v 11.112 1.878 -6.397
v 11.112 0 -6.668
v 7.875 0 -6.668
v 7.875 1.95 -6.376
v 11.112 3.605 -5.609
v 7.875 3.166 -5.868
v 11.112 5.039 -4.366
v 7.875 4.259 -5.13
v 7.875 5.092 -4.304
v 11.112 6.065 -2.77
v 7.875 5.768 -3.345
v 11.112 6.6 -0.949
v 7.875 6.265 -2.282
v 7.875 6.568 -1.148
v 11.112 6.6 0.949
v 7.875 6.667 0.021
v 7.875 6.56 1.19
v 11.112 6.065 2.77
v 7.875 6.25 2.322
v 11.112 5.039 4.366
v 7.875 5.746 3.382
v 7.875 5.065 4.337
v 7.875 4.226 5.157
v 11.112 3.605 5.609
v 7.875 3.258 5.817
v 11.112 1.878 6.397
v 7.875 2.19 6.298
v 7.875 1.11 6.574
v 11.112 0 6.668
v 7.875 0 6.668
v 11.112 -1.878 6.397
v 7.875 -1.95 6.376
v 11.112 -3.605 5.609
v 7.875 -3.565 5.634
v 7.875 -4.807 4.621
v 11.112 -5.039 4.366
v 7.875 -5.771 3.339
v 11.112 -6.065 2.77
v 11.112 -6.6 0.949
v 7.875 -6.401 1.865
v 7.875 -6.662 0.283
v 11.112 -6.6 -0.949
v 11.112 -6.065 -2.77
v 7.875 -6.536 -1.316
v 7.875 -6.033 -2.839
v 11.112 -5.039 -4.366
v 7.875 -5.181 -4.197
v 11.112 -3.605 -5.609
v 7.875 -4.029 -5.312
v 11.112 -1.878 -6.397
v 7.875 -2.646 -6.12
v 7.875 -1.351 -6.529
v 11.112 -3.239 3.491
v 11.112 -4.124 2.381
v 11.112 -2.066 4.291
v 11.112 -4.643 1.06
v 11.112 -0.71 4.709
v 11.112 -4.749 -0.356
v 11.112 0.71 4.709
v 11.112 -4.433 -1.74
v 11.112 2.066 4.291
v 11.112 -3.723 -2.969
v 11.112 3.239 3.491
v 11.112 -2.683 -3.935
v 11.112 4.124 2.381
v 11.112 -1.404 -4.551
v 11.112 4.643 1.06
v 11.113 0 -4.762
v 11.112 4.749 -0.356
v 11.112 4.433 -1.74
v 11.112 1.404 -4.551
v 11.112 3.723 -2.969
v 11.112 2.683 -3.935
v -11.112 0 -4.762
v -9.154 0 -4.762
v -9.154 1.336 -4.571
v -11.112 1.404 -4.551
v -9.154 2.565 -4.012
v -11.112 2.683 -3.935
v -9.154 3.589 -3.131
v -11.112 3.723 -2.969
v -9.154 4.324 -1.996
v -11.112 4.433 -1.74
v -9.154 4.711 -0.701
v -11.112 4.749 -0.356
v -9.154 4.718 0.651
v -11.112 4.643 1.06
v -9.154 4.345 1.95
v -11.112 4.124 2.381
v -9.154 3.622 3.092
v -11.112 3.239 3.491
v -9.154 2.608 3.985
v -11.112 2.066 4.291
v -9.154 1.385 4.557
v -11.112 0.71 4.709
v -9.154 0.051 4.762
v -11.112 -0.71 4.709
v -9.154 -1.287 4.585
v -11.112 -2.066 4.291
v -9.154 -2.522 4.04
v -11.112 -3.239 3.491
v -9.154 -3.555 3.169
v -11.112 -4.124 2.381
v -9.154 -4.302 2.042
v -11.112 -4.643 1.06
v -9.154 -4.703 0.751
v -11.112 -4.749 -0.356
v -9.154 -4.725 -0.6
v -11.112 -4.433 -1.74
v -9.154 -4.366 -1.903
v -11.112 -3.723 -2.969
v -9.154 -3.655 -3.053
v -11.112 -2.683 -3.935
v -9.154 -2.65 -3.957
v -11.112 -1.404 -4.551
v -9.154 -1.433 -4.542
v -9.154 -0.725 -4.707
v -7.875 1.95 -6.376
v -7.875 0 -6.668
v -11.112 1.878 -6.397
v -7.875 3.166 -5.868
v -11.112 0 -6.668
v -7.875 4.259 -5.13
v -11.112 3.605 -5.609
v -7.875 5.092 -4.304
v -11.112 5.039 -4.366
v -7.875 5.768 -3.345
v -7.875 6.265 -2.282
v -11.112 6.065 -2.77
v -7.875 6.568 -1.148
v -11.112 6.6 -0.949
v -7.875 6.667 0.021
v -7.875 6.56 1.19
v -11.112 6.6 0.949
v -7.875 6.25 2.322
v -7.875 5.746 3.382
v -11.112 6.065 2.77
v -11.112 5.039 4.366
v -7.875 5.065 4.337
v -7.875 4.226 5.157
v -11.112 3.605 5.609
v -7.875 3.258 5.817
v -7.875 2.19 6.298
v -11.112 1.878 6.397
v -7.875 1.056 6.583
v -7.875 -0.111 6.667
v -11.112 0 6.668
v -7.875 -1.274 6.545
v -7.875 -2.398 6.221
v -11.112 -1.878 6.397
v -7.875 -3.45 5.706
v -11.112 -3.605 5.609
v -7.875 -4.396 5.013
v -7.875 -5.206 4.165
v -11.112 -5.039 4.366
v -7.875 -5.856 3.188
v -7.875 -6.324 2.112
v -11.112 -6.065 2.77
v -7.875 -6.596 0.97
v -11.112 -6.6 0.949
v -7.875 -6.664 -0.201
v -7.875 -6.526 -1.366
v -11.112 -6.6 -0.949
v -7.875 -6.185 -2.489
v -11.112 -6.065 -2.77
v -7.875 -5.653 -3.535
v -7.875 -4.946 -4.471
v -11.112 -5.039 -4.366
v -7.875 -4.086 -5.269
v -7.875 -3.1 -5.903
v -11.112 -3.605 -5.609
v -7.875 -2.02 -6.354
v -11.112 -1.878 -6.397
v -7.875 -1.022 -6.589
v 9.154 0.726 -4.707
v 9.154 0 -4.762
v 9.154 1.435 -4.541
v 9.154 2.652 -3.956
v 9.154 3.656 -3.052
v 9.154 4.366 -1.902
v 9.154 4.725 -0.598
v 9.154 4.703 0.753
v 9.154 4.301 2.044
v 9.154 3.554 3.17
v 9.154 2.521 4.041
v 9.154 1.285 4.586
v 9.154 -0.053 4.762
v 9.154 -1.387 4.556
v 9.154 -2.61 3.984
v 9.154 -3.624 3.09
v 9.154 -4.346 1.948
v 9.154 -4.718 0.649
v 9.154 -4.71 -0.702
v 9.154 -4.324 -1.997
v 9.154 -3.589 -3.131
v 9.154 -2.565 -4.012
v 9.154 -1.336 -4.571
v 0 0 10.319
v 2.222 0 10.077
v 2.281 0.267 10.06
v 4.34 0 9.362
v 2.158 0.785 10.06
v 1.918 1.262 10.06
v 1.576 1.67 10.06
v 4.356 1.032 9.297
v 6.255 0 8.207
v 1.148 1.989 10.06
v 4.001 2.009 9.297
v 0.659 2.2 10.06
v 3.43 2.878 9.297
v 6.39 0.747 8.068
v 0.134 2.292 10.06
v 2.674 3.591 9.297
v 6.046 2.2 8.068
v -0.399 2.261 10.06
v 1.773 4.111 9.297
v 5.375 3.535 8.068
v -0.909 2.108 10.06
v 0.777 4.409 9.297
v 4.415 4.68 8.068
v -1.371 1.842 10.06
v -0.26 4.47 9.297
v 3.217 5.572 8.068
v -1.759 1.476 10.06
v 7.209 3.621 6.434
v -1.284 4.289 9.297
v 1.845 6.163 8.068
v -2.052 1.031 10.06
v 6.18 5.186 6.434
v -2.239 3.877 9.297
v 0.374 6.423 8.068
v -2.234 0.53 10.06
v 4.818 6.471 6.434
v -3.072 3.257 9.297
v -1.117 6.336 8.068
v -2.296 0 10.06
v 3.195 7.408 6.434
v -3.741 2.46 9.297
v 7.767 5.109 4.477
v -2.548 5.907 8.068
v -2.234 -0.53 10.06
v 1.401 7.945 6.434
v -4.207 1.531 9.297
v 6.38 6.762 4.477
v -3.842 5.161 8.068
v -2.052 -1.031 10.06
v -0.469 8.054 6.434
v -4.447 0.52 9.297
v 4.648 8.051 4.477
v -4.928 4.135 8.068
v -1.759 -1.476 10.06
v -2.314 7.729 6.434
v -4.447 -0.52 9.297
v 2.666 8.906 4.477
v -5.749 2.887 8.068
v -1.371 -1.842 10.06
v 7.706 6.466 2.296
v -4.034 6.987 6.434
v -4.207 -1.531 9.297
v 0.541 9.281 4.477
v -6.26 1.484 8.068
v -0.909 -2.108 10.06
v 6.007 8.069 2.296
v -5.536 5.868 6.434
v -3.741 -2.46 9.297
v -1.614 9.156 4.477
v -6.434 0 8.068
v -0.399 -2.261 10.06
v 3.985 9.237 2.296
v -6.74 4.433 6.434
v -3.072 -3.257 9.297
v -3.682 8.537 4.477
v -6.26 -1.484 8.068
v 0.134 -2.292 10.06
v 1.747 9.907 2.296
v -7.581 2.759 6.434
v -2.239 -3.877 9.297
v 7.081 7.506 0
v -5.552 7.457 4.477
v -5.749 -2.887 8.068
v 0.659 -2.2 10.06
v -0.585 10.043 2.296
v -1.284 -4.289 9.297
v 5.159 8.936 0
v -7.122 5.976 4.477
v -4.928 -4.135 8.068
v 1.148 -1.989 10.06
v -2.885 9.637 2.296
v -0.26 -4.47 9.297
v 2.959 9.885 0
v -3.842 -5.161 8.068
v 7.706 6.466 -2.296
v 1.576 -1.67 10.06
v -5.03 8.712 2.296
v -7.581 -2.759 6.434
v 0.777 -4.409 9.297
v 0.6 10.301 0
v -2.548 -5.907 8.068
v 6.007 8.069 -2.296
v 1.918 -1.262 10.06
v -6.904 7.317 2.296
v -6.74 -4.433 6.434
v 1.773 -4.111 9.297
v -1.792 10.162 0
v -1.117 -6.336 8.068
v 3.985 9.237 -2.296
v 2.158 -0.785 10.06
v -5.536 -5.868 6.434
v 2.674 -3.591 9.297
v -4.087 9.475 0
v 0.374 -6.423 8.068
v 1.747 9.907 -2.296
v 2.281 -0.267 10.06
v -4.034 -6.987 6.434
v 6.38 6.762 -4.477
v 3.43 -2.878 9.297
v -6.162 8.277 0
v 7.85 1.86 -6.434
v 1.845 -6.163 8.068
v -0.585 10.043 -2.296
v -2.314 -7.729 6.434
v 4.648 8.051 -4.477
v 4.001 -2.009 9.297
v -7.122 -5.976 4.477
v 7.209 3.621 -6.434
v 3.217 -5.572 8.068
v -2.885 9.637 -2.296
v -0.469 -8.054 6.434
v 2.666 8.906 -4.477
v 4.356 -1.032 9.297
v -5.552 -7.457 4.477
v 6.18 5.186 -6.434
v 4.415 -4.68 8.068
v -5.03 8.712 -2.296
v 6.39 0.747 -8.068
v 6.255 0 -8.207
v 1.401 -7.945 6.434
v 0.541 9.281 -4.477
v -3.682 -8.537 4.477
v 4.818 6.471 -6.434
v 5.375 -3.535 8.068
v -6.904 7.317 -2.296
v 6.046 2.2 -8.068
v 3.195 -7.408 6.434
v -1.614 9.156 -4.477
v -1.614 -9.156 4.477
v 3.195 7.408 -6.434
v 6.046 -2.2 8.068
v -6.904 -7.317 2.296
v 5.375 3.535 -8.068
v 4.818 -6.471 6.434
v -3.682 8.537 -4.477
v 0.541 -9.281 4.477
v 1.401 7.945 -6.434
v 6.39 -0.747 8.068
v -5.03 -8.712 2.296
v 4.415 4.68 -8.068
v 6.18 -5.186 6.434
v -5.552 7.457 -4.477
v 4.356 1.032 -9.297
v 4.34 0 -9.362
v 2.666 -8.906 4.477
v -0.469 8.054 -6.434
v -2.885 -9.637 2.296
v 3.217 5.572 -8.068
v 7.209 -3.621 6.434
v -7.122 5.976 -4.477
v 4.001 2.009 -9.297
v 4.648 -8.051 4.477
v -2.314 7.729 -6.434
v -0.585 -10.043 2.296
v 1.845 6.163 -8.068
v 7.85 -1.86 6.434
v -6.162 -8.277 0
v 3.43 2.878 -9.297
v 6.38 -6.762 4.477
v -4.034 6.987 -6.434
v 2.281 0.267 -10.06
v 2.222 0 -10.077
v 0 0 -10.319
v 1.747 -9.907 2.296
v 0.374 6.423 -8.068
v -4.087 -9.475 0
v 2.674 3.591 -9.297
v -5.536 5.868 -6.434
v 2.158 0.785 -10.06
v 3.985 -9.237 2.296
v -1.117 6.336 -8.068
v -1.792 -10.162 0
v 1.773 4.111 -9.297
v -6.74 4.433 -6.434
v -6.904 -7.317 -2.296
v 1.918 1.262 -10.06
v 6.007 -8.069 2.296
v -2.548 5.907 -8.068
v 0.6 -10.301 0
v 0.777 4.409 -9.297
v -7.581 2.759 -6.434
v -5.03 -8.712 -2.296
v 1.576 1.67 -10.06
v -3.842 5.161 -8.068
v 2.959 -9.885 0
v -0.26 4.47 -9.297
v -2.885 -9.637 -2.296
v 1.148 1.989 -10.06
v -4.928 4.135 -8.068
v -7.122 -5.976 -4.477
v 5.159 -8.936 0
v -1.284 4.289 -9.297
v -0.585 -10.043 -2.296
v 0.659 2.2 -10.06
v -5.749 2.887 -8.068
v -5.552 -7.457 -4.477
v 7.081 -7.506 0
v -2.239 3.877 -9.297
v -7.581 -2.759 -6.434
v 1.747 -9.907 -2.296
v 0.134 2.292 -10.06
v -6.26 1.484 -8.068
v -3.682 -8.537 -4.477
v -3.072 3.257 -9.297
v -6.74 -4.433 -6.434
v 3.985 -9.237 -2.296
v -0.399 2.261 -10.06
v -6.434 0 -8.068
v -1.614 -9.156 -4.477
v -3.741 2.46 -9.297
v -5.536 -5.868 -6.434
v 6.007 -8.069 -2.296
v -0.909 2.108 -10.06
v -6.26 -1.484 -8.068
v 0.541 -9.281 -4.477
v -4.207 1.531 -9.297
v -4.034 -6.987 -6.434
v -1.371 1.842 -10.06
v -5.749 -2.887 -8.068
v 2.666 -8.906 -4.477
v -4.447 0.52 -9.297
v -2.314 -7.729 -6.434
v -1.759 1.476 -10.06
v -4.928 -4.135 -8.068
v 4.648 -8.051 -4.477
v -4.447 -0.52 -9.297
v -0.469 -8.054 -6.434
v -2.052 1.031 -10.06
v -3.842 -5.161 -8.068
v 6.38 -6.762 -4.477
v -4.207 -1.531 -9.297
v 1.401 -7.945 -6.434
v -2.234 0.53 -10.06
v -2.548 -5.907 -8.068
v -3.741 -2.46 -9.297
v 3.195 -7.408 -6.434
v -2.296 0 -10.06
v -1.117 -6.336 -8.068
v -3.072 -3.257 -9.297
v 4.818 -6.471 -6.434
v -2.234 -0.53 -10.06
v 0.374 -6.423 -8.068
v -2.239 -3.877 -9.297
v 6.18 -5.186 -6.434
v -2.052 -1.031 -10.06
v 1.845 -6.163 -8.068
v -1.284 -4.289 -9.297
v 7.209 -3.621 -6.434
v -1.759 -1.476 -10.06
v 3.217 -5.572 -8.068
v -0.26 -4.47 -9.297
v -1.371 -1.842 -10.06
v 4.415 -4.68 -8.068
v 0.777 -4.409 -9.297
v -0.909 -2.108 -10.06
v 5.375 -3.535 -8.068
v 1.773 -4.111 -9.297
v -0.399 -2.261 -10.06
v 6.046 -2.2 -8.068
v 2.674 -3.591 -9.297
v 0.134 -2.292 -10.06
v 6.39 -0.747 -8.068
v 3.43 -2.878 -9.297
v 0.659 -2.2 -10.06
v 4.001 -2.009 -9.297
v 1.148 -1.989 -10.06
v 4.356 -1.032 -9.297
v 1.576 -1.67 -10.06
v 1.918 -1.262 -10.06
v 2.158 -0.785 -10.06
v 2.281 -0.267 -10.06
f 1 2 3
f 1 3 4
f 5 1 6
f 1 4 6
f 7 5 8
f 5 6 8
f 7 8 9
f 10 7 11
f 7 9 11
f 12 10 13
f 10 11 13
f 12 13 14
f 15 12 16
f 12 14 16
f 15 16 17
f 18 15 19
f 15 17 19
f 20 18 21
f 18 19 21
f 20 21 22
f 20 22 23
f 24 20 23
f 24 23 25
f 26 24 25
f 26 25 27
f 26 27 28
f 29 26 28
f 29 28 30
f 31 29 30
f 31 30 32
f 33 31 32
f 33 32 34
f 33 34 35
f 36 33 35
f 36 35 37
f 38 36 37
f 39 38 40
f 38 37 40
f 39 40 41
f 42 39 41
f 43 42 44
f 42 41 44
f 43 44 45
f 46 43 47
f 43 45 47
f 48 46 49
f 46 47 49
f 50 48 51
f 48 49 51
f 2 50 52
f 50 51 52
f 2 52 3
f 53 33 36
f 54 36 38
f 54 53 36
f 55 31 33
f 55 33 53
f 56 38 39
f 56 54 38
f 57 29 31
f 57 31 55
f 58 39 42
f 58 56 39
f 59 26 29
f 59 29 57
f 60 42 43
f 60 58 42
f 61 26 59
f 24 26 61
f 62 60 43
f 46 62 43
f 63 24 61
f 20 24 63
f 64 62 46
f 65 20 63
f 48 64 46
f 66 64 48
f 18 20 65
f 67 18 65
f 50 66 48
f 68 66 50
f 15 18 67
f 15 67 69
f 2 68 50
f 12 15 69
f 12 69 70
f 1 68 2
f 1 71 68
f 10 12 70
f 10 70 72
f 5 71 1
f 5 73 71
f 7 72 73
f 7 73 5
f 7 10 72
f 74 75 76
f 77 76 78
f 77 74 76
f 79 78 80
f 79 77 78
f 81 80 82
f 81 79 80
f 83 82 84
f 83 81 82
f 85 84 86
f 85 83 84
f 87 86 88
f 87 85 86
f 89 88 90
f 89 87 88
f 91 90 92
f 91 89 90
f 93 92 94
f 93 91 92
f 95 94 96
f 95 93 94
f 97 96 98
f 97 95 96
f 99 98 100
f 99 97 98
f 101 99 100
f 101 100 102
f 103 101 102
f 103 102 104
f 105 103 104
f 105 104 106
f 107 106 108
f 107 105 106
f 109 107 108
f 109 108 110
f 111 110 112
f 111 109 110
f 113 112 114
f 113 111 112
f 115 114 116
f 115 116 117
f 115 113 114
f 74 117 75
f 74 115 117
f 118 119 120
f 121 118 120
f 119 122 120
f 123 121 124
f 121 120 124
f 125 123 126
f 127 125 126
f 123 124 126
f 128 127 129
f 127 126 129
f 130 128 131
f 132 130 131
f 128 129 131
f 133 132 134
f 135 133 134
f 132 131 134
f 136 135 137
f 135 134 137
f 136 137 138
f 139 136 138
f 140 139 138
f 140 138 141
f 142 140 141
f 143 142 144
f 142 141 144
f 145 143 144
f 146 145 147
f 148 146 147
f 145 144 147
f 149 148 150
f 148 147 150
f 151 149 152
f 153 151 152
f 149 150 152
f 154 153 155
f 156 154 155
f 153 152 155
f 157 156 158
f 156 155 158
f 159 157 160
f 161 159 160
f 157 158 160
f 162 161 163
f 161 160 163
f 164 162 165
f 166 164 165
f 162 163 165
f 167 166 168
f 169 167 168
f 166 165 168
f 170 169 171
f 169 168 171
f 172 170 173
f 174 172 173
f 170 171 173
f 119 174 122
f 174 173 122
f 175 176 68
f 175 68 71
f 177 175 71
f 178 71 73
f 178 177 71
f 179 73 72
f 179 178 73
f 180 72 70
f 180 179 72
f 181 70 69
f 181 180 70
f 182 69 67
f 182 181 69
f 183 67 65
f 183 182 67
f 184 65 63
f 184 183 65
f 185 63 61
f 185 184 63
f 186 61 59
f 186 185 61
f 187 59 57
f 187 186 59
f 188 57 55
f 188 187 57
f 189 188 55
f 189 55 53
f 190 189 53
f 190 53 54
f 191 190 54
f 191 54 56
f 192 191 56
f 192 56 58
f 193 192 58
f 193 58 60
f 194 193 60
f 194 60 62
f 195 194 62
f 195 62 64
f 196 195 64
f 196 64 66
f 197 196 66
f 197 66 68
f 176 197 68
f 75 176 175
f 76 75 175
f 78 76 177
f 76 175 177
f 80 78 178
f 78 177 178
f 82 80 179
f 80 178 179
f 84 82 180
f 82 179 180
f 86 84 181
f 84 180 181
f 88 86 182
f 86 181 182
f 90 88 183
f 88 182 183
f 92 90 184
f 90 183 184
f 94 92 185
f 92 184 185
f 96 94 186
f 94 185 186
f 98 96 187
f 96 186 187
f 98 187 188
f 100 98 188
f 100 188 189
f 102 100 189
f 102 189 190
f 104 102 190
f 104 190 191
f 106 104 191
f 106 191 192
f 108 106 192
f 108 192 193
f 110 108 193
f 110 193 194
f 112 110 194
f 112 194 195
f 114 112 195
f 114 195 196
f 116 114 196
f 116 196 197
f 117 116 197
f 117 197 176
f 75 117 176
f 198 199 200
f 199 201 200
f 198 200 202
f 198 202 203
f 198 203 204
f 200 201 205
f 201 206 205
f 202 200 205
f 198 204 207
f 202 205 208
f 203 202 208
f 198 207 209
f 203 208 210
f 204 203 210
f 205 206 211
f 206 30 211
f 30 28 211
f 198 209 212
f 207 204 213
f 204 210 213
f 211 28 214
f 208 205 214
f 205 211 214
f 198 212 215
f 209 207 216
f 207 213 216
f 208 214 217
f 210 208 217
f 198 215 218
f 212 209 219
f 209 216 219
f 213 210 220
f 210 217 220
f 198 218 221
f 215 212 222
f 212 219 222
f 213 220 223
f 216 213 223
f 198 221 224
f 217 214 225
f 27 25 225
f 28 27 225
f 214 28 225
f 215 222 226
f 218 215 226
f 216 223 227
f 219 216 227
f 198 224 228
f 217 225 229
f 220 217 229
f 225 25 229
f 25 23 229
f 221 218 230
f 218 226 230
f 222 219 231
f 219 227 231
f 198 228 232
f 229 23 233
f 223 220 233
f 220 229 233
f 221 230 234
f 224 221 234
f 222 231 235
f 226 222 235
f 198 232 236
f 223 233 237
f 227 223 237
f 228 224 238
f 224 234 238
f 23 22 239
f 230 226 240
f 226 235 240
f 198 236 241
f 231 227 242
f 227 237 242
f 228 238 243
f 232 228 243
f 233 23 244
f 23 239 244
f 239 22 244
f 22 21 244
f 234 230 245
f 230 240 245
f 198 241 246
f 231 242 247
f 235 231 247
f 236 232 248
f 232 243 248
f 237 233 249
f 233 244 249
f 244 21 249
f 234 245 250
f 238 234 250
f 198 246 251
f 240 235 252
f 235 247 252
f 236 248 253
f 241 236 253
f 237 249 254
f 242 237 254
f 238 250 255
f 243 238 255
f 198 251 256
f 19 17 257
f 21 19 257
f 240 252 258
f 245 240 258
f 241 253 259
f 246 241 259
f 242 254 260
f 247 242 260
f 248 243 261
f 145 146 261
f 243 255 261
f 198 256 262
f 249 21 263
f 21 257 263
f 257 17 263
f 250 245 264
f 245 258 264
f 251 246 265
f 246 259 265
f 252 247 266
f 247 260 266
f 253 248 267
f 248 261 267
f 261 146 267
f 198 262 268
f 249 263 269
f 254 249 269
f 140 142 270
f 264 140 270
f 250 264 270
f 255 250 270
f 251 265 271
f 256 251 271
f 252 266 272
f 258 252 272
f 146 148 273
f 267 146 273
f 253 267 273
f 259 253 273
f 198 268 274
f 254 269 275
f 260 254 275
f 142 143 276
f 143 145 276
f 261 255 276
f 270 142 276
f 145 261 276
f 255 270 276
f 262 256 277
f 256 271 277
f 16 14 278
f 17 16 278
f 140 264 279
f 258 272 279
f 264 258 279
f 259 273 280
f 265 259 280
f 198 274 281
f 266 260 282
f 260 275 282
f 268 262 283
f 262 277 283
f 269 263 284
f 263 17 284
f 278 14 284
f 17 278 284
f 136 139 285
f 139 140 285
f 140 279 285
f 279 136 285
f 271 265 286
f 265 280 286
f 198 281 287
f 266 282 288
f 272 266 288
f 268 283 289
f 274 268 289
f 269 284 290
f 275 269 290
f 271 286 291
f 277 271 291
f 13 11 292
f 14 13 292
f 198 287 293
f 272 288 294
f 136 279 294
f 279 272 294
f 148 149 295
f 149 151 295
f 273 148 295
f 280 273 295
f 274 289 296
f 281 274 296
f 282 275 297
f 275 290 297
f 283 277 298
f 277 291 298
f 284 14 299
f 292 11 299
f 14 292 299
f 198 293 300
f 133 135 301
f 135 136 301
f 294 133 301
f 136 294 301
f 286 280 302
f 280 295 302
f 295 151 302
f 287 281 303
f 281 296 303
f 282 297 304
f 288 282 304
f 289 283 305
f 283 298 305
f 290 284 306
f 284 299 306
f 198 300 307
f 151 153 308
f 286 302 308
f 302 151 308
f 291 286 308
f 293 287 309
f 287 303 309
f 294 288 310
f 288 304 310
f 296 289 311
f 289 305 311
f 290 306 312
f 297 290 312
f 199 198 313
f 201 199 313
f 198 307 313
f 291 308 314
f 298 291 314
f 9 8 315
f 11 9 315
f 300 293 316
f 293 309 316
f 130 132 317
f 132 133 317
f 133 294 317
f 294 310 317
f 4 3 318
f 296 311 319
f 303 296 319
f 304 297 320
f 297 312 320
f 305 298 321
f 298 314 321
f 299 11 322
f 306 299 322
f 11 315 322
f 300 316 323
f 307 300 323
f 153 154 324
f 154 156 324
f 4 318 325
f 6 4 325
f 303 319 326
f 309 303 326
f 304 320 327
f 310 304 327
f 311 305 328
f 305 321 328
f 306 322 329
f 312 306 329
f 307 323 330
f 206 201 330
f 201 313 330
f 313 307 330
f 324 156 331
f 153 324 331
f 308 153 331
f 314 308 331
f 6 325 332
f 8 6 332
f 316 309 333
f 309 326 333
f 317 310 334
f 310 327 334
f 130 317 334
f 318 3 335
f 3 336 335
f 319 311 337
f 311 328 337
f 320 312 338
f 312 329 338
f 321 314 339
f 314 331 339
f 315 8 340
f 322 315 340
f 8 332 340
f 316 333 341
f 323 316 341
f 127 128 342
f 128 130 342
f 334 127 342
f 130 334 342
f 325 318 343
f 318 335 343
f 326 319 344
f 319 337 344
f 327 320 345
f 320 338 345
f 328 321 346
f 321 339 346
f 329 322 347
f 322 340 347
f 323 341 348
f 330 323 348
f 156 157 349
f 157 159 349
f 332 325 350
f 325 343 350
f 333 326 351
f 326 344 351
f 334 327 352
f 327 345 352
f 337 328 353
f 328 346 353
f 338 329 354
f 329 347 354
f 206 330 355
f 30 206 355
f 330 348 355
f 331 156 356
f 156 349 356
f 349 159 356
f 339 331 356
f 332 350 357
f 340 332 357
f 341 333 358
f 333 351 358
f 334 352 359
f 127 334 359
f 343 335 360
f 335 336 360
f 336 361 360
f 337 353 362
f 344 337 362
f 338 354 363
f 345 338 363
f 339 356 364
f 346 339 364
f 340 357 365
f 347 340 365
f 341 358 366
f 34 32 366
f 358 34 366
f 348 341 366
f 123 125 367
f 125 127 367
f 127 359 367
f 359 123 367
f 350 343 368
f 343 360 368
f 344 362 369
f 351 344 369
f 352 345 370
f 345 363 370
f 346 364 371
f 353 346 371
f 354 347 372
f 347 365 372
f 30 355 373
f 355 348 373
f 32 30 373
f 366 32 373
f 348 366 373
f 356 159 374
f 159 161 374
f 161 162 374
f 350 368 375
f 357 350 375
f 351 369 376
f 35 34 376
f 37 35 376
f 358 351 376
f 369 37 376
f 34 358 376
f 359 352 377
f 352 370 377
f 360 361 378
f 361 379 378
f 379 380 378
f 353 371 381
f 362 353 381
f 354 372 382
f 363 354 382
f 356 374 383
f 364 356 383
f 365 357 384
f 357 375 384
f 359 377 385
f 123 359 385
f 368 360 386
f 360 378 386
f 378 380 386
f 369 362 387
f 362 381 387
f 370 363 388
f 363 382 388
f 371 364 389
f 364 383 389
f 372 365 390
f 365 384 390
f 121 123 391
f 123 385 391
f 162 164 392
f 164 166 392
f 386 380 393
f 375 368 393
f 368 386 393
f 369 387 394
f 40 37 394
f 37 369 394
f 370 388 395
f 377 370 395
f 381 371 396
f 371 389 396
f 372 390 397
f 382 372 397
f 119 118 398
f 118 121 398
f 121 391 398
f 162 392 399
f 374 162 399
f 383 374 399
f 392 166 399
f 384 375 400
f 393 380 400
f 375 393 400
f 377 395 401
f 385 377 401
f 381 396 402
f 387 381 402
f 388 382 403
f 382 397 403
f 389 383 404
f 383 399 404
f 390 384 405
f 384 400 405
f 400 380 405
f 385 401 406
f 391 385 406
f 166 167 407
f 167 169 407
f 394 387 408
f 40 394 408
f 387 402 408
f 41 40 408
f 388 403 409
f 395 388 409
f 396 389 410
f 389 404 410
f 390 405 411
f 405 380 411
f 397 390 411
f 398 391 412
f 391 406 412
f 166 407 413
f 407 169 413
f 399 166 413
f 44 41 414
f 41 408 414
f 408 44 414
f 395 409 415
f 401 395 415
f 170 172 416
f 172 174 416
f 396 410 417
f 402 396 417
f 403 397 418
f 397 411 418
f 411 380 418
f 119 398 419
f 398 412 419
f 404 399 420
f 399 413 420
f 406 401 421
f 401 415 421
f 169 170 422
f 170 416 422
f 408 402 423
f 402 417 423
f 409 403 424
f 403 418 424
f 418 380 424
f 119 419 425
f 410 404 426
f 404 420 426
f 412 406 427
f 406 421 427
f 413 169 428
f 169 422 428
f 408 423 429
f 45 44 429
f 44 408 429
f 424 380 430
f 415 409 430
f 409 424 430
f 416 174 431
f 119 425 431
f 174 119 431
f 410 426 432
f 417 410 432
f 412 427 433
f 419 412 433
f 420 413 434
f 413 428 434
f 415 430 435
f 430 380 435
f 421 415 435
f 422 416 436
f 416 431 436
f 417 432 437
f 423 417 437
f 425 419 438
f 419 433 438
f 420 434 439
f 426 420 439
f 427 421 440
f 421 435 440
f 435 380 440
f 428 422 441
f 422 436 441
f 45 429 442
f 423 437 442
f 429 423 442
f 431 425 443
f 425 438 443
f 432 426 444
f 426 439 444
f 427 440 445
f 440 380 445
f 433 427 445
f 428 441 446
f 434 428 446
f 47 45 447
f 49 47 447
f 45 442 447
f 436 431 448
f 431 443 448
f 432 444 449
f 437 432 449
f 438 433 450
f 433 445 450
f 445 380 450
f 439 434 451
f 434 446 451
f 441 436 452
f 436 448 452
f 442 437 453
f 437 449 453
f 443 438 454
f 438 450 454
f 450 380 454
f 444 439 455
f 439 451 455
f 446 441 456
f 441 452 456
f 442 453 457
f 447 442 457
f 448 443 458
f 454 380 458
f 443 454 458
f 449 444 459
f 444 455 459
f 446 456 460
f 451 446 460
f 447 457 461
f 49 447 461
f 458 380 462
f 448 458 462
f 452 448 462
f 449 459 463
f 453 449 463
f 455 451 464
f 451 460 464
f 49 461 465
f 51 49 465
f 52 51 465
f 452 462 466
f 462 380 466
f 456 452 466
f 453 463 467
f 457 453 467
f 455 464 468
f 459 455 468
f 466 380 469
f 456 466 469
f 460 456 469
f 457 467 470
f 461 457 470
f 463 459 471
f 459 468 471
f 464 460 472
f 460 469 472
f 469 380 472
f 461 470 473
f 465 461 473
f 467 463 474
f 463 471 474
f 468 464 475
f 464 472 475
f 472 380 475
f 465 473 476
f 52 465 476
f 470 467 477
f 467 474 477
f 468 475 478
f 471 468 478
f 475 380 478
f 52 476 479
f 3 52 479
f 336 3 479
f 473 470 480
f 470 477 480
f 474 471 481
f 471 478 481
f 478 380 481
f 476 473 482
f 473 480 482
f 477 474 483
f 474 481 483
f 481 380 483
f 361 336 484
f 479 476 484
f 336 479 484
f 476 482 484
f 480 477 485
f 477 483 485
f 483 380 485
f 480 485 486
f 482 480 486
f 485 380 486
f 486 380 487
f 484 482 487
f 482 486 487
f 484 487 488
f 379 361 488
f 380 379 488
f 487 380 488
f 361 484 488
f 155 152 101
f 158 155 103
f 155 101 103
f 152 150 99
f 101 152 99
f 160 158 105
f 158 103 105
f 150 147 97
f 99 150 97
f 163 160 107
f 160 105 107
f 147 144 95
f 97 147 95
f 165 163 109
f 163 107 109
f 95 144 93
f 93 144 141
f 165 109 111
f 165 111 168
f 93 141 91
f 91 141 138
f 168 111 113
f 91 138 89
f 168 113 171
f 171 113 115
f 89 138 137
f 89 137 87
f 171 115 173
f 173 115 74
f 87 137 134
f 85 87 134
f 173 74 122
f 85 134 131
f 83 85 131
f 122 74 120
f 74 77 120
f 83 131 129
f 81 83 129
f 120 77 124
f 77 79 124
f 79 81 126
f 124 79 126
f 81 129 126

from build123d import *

# Parameters (mm, degrees)
BOSS_EXTRUDE1_DEPTH      = 11.1125
BOSS_EXTRUDE1_DEPTH_BACK = 11.1125
SKETCH3_R                = 6.6675
SKETCH3_R_2              = 4.7625
SKETCH4_R                = 4.7625
CUT_EXTRUDE1_DEPTH       = 27.587663165


with BuildPart() as part:
    # Sketch2 → Revolve1 (revolve)
    with BuildSketch(Plane(origin=(0, 0, 0), x_dir=(1, 0, 0), z_dir=(0, 1, 0))):
        with BuildLine():
            Line((0, 10.31875), (0, -10.31875))
            ThreePointArc((0, -10.31875), (10.31875, 0), (0, 10.31875))
        make_face()
    revolve(axis=Axis((0, 0, -10.31875), (0, 0, 1)))

    # Sketch3 → Boss-Extrude1 (add, two sides: drawn at the far end of the back side and taken through both)
    with BuildSketch(Plane(origin=(0, 0, 0), x_dir=(0, 0, -1), z_dir=(1, 0, 0)).offset(-BOSS_EXTRUDE1_DEPTH_BACK)):
        Circle(SKETCH3_R)
        Circle(SKETCH3_R_2, mode=Mode.SUBTRACT)
    extrude(amount=BOSS_EXTRUDE1_DEPTH + BOSS_EXTRUDE1_DEPTH_BACK)

    # Sketch4 → Cut-Extrude1 (cut, through all)
    with BuildSketch(Plane(origin=(11.1125, 0, 0), x_dir=(0, 0, -1), z_dir=(1, 0, 0))):
        Circle(SKETCH4_R)
    extrude(amount=-CUT_EXTRUDE1_DEPTH, mode=Mode.SUBTRACT)


solid = part.part
